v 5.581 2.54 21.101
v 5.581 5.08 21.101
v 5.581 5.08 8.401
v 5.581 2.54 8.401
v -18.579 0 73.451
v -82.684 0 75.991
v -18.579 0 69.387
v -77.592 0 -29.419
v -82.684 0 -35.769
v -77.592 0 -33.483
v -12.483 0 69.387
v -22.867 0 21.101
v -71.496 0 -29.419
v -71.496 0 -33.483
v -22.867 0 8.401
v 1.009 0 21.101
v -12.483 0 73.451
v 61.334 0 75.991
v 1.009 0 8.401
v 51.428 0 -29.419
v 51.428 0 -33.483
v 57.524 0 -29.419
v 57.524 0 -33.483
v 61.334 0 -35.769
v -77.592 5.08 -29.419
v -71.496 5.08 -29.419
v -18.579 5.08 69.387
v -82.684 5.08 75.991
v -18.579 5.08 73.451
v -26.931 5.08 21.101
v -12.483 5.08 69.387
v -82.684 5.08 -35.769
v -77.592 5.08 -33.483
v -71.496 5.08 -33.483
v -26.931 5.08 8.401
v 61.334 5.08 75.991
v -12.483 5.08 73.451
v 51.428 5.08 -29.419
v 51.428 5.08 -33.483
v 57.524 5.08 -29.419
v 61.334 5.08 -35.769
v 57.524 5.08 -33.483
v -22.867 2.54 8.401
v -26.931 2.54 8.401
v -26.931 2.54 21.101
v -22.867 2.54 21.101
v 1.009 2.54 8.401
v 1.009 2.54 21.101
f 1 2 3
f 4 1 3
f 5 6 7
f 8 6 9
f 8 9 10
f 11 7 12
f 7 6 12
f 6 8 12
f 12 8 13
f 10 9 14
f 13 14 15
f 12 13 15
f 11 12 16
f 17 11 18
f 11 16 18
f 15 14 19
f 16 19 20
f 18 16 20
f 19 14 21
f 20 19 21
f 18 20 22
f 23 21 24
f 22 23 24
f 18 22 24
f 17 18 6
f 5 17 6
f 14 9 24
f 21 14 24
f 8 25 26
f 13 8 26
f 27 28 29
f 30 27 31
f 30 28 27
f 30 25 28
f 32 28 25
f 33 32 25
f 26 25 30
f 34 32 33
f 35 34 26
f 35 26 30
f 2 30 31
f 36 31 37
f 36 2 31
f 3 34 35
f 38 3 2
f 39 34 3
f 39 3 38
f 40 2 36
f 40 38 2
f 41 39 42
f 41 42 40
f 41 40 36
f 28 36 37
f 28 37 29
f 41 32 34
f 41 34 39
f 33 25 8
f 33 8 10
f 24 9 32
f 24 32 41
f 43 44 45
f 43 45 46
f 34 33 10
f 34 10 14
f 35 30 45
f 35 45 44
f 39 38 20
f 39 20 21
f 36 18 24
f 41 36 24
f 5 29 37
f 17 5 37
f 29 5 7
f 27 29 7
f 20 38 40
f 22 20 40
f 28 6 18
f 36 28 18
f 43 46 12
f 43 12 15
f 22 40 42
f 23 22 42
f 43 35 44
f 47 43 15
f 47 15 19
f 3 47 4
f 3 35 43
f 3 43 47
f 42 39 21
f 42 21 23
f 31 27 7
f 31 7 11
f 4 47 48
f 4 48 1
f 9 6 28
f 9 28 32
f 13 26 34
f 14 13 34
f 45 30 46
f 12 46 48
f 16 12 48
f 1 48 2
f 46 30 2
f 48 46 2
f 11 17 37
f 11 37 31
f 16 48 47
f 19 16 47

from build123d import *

# Parameters (mm, degrees)
SKETCH3_W           = 144.018
SKETCH3_H           = 111.76
BOSS_EXTRUDE2_DEPTH = 5.08
SKETCH5_W           = 6.096
SKETCH5_H           = 4.064
CUT_EXTRUDE1_DEPTH  = 5.08
SKETCH6_W           = 32.512
SKETCH6_H           = 12.7
CUT_EXTRUDE2_DEPTH  = 2.54
SKETCH7_W           = 23.876
SKETCH7_H           = 12.7
CUT_EXTRUDE3_DEPTH  = 2.54


with BuildPart() as part:
    # Sketch3 → Boss-Extrude2 (new body)
    with BuildSketch(Plane(origin=(0, 0, 0), x_dir=(1, 0, 0), z_dir=(0, 1, 0))):
        with Locations((-10.674968857, -20.111055569)):
            Rectangle(SKETCH3_W, SKETCH3_H)
    extrude(amount=BOSS_EXTRUDE2_DEPTH)

    # Sketch5 → Cut-Extrude1 (cut)
    with BuildSketch(Plane(origin=(0, 5.08, 0), x_dir=(1, 0, 0), z_dir=(0, 1, 0))):
        with Locations((-74.544129387, 31.450944431)):
            Rectangle(SKETCH5_W, SKETCH5_H)
        with Locations((54.476031143, 31.450944431)):
            Rectangle(SKETCH5_W, SKETCH5_H)
        with Locations((-15.53142752, -71.419055569)):
            Rectangle(SKETCH5_W, SKETCH5_H)
    extrude(amount=-CUT_EXTRUDE1_DEPTH, mode=Mode.SUBTRACT)

    # Sketch6 → Cut-Extrude2 (cut)
    with BuildSketch(Plane(origin=(0, 5.08, 0), x_dir=(1, 0, 0), z_dir=(0, 1, 0))):
        with Locations((-10.674968857, -14.750552476)):
            Rectangle(SKETCH6_W, SKETCH6_H)
    extrude(amount=-CUT_EXTRUDE2_DEPTH, mode=Mode.SUBTRACT)

    # Sketch7 → Cut-Extrude3 (cut)
    with BuildSketch(Plane(origin=(0, 2.54, 0), x_dir=(1, 0, 0), z_dir=(0, 1, 0))):
        with Locations((-10.928968857, -14.750552476)):
            Rectangle(SKETCH7_W, SKETCH7_H)
    extrude(amount=-CUT_EXTRUDE3_DEPTH, mode=Mode.SUBTRACT)


solid = part.part
